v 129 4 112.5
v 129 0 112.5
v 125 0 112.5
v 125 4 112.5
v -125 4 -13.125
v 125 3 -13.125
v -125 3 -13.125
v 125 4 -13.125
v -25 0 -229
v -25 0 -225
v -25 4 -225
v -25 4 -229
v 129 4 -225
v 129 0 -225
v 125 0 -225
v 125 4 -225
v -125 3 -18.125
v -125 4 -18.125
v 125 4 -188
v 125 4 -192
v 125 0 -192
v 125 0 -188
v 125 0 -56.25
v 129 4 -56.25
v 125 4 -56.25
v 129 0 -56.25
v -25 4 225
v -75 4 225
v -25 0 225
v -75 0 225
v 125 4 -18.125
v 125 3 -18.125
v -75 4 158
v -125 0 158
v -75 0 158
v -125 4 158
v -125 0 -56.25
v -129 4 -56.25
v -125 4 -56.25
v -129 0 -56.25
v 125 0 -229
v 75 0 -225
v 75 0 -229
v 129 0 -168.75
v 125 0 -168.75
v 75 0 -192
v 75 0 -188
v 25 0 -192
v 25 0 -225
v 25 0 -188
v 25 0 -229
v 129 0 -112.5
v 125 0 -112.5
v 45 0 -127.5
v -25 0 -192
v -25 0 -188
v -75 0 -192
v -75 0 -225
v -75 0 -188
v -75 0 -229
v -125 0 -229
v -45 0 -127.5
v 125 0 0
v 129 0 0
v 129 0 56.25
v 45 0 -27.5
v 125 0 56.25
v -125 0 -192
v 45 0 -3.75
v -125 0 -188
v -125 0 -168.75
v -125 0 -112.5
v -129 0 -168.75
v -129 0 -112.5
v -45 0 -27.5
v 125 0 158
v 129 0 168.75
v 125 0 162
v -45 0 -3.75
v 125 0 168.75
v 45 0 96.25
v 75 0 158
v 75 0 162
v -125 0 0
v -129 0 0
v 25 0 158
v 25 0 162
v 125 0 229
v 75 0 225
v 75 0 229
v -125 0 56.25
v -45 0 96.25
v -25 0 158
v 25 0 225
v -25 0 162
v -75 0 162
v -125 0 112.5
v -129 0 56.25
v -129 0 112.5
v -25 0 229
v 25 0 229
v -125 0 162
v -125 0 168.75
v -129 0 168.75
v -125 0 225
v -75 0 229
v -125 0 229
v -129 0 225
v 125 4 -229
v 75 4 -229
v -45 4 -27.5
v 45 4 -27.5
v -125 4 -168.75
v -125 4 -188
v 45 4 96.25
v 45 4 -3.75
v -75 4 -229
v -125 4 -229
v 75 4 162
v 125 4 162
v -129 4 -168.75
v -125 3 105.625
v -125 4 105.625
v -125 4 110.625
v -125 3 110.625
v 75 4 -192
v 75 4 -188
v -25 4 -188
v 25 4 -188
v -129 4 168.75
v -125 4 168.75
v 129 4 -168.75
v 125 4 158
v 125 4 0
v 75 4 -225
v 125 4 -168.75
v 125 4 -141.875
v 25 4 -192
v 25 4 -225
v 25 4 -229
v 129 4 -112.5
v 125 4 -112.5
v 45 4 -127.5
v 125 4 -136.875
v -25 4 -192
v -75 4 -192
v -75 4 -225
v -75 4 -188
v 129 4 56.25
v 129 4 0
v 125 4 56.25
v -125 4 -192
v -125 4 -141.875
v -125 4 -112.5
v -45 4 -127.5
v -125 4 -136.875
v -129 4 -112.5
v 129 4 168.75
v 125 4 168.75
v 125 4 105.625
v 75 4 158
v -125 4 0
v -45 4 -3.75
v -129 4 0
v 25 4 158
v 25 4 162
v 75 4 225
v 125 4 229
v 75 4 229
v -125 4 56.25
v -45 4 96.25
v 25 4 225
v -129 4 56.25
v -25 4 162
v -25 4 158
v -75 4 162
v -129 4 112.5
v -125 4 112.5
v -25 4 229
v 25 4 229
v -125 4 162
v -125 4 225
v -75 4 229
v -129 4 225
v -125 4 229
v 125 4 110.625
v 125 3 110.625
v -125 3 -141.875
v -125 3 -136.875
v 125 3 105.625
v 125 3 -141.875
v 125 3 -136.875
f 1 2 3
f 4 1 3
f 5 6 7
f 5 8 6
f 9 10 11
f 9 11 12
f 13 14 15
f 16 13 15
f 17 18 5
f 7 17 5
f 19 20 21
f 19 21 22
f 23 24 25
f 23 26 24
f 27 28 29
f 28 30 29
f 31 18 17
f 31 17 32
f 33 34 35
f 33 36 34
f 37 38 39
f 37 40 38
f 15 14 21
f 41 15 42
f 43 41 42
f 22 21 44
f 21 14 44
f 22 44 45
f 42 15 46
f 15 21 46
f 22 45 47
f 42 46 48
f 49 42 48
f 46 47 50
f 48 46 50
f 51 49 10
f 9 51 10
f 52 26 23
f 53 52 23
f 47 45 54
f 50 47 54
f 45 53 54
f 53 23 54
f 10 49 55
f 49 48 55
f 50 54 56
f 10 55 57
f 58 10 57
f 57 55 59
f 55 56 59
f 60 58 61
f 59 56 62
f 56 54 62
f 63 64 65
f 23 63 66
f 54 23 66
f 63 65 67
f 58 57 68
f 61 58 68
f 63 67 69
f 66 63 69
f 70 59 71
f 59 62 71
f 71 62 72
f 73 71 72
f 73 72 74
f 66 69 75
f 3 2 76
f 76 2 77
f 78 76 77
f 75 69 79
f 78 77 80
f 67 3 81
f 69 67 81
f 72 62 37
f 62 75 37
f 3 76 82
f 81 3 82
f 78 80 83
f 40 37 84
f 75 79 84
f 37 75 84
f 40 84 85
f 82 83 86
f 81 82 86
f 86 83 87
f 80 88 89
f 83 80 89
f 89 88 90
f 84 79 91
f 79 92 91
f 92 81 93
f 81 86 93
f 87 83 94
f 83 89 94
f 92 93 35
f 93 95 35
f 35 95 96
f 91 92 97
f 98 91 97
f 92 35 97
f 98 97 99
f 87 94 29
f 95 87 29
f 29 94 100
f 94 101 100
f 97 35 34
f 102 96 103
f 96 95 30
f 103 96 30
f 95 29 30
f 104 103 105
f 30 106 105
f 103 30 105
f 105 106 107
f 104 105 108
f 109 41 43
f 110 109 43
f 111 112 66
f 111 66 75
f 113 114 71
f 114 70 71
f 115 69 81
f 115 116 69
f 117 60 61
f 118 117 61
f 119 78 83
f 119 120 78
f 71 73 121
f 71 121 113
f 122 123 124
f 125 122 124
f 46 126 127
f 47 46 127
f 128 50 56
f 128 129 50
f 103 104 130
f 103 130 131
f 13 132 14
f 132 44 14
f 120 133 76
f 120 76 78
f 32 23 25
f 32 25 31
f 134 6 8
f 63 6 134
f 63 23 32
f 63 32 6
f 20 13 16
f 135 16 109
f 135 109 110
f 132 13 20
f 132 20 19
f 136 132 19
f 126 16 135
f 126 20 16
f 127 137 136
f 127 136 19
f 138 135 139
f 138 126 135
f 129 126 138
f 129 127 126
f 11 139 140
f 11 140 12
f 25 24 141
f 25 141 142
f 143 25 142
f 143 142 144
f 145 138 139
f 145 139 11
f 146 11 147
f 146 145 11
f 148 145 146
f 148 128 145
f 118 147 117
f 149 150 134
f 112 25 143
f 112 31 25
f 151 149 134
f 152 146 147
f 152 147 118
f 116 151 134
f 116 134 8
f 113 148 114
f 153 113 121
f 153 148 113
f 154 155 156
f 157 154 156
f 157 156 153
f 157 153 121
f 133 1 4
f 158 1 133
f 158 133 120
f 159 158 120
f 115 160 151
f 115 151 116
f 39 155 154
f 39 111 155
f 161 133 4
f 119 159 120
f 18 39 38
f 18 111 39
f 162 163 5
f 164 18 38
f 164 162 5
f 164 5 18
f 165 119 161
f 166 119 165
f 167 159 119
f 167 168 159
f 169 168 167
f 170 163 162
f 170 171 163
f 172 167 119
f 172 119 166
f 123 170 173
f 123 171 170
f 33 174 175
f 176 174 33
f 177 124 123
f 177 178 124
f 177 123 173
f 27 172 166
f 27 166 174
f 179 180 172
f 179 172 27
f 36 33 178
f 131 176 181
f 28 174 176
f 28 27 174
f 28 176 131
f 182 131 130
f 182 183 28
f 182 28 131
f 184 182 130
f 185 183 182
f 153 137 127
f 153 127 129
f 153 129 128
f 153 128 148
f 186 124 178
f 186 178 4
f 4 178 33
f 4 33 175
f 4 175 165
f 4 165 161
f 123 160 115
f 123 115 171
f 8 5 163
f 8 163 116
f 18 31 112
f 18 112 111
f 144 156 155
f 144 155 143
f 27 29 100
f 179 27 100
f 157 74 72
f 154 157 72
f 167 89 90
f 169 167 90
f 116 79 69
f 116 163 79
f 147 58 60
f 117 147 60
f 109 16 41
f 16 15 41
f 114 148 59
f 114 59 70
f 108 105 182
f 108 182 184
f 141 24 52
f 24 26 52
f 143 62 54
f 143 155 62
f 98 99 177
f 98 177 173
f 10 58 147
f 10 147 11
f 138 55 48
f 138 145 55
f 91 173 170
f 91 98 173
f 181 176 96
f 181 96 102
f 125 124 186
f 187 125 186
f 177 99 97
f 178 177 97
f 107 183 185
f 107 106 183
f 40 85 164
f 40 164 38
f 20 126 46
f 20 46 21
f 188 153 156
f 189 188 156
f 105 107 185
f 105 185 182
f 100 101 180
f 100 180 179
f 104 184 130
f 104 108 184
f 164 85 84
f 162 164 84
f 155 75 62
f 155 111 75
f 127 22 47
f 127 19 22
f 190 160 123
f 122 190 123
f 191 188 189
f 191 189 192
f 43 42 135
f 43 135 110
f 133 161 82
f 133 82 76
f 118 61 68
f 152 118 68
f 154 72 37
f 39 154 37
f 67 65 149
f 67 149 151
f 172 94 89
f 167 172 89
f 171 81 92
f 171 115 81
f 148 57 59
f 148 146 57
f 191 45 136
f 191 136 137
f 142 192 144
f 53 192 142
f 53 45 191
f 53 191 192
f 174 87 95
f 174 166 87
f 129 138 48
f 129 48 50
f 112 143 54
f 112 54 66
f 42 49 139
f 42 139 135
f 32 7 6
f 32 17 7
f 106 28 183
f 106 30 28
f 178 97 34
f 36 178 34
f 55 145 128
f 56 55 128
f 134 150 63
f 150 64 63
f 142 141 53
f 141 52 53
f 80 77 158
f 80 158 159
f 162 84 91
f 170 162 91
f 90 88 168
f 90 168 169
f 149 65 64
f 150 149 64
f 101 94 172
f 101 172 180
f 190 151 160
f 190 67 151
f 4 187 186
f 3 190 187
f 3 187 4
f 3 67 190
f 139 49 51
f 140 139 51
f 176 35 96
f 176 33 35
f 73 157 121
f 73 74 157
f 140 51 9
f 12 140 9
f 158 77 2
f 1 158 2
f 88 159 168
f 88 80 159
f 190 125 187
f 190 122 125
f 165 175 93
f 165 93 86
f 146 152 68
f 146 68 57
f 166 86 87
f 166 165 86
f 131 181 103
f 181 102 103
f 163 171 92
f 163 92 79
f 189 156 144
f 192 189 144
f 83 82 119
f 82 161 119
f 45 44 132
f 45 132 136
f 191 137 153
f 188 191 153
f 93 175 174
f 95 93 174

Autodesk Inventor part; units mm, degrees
ref_plane "YZ Plane" through (0, 0, 0) normal (1, 0, 0) x (0, 1, 0)
ref_plane "XZ Plane" through (0, 0, 0) normal (0, 1, 0) x (-1, 0, 0)
ref_plane "XY Plane" through (0, 0, 0) normal (0, 0, 1) x (1, 0, 0)
sketch "Sketch1" plane through (0, 0, 0) normal (0, 1, 0) x (-1, 0, 0)
  line L0 (-125, 225) -> (125, 225) construction
  line L1 (125, 225) -> (125, -225) construction
  line L2 (125, -225) -> (-125, -225) construction
  line L3 (-125, -225) -> (-125, 225) construction
  line L4 (-125, 225) -> (125, -225) construction
  line L5 (125, 225) -> (-125, -225) construction
  line L6 (125, 225) -> (75, 225) construction
  line L7 (75, 225) -> (75, 229)
  line L8 (75, 229) -> (125, 229)
  line L9 (125, 229) -> (125, 225)
  line L10 (125, 225) -> (129, 225)
  line L11 (129, 225) -> (129, 168.75)
  line L12 (129, 168.75) -> (125, 168.75)
  line L13 (125, 168.75) -> (125, 225) construction
  line L14 (-125, 225) -> (-129, 225) construction
  line L15 (-129, 225) -> (-129, 168.75) construction
  line L16 (-129, 168.75) -> (-125, 168.75)
  line L17 (-125, 168.75) -> (-125, 225)
  line L18 (125, -225) -> (75, -225) construction
  line L19 (75, -225) -> (75, -229)
  line L20 (75, -229) -> (125, -229)
  line L21 (125, -229) -> (125, -225)
  line L22 (125, 112.5) -> (125, 168.75)
  line L23 (125, 168.75) -> (129, 168.75)
  line L24 (129, 112.5) -> (125, 112.5)
  line L25 (129, 168.75) -> (129, 112.5) construction
  line L26 (-125, 112.5) -> (-125, 168.75) construction
  line L27 (-125, 168.75) -> (-129, 168.75)
  line L28 (-129, 168.75) -> (-129, 112.5)
  line L29 (-129, 112.5) -> (-125, 112.5)
  line L30 (125, 56.25) -> (125, 112.5) construction
  line L31 (125, 112.5) -> (129, 112.5)
  line L32 (129, 56.25) -> (125, 56.25)
  line L33 (129, 112.5) -> (129, 56.25)
  line L34 (-125, 56.25) -> (-125, 112.5)
  line L35 (-125, 112.5) -> (-129, 112.5)
  line L36 (-129, 112.5) -> (-129, 56.25) construction
  line L37 (-129, 56.25) -> (-125, 56.25)
  line L38 (125, 0) -> (125, 56.25)
  line L39 (125, 56.25) -> (129, 56.25)
  line L40 (129, 0) -> (125, 0)
  line L41 (129, 56.25) -> (129, 0) construction
  line L42 (-125, 0) -> (-125, 56.25) construction
  line L43 (-125, 56.25) -> (-129, 56.25)
  line L44 (-129, 56.25) -> (-129, 0)
  line L45 (-129, 0) -> (-125, 0)
  line L46 (125, -56.25) -> (125, 0) construction
  line L47 (125, 0) -> (129, 0)
  line L48 (129, -56.25) -> (125, -56.25)
  line L49 (129, 0) -> (129, -56.25)
  line L50 (-125, -56.25) -> (-125, 0)
  line L51 (-125, 0) -> (-129, 0)
  line L52 (-129, 0) -> (-129, -56.25) construction
  line L53 (-129, -56.25) -> (-125, -56.25)
  line L54 (125, -112.5) -> (125, -56.25)
  line L55 (125, -56.25) -> (129, -56.25)
  line L56 (129, -112.5) -> (125, -112.5)
  line L57 (129, -56.25) -> (129, -112.5) construction
  line L58 (-125, -112.5) -> (-125, -56.25) construction
  line L59 (-125, -56.25) -> (-129, -56.25)
  line L60 (-129, -56.25) -> (-129, -112.5)
  line L61 (-129, -112.5) -> (-125, -112.5)
  line L62 (125, -168.75) -> (125, -112.5) construction
  line L63 (125, -112.5) -> (129, -112.5)
  line L64 (129, -168.75) -> (125, -168.75)
  line L65 (129, -112.5) -> (129, -168.75)
  line L66 (-125, -168.75) -> (-125, -112.5)
  line L67 (-125, -112.5) -> (-129, -112.5)
  line L68 (-129, -112.5) -> (-129, -168.75) construction
  line L69 (-129, -168.75) -> (-125, -168.75)
  line L70 (125, -225) -> (125, -168.75)
  line L71 (125, -168.75) -> (129, -168.75)
  line L72 (129, -225) -> (125, -225) construction
  line L73 (129, -168.75) -> (129, -225) construction
  line L74 (-125, -225) -> (-125, -168.75) construction
  line L75 (-125, -168.75) -> (-129, -168.75)
  line L76 (-129, -168.75) -> (-129, -225)
  line L77 (-129, -225) -> (-125, -225)
  line L78 (75, 229) -> (75, 225)
  line L79 (25, 225) -> (25, 229)
  line L80 (25, 229) -> (75, 229) construction
  line L81 (75, 225) -> (25, 225)
  line L82 (75, -225) -> (25, -225)
  line L83 (25, -225) -> (25, -229)
  line L84 (25, -229) -> (75, -229) construction
  line L85 (75, -229) -> (75, -225)
  line L86 (25, 229) -> (25, 225)
  line L87 (-25, 225) -> (-25, 229)
  line L88 (-25, 229) -> (25, 229)
  line L89 (25, 225) -> (-25, 225) construction
  line L90 (25, -225) -> (-25, -225) construction
  line L91 (-25, -225) -> (-25, -229)
  line L92 (-25, -229) -> (25, -229)
  line L93 (25, -229) -> (25, -225)
  line L94 (-25, 229) -> (-25, 225)
  line L95 (-75, 225) -> (-75, 229)
  line L96 (-75, 229) -> (-25, 229) construction
  line L97 (-25, 225) -> (-75, 225)
  line L98 (-25, -225) -> (-75, -225)
  line L99 (-75, -225) -> (-75, -229)
  line L100 (-75, -229) -> (-25, -229) construction
  line L101 (-25, -229) -> (-25, -225)
  line L102 (-75, 229) -> (-75, 225)
  line L103 (-125, 225) -> (-125, 229)
  line L104 (-125, 229) -> (-75, 229)
  line L105 (-75, 225) -> (-125, 225) construction
  line L106 (-75, -225) -> (-125, -225) construction
  line L107 (-125, -225) -> (-125, -229)
  line L108 (-125, -229) -> (-75, -229)
  line L109 (-75, -229) -> (-75, -225)
  point P0 (0, 0)
  point P1 (75, -225)
  point P2 (25, -225)
  point P3 (-25, -225)
  point P4 (-75, -225)
  point P5 (-129, 168.75)
  point P6 (-129, 56.25)
  point P7 (-129, -168.75)
  dimension "d0" = 250
  dimension "d1" = 450
  dimension "d2" = 50
  dimension "d3" = 4
  dimension "d4" = 4
  dimension "d5" = 56.25
  dimension "d6" = 4
  dimension "d7" = 56.25
  dimension "d8" = 50
  dimension "d9" = 4
  dimension "d12" = 56.25
  dimension "d19" = 50
extrude "Extrusion1" add sketch "Sketch1" along normal blind 4
sketch "Sketch2" plane through (0, 4, 0) normal (0, 1, 0) x (1, 0, 0)
  line L0 (-125, 112.5) -> (-125, 56.25) projected
  line L1 (129, 112.5) -> (125, 112.5) projected
  line L2 (-125, 112.5) -> (125, 112.5) construction
  line L3 (125, -112.5) -> (125, -56.25) projected
  line L4 (125, -56.25) -> (-125, -56.25) construction
  line L5 (-45, 127.5) -> (45, 127.5)
  line L6 (45, 127.5) -> (45, 27.5)
  line L7 (45, 27.5) -> (-45, 27.5)
  line L8 (-45, 27.5) -> (-45, 127.5)
  line L9 (-45, 127.5) -> (45, 27.5) construction
  line L10 (45, 127.5) -> (-45, 27.5) construction
  line L11 (45, -96.25) -> (-45, -96.25)
  line L12 (-45, -96.25) -> (-45, 3.75)
  line L13 (-45, 3.75) -> (45, 3.75)
  line L14 (45, 3.75) -> (45, -96.25)
  line L15 (45, -96.25) -> (-45, 3.75) construction
  line L16 (-45, -96.25) -> (45, 3.75) construction
  line L17 (25, 229) -> (-25, 229) projected
  point P0 (0, 0)
  point P1 (0, 77.5)
  point P2 (0, -46.25)
  point P3 (0, -46.25)
  point P4 (0, 77.5)
  point P5 (0, 77.5)
  point P6 (0, 229)
  point P7 (0, -46.25)
  dimension "d26" = 90
  dimension "d27" = 100
  dimension "d28" = 90
  dimension "d29" = 100
  dimension "d59" = 35
  dimension "d60" = 10
extrude "Extrusion2" cut sketch "Sketch2" against normal up to next
sketch "Sketch3" plane through (0, 4, 0) normal (0, 1, 0) x (1, 0, 0)
  line L0 (-129, 56.25) -> (-129, 0) projected
  line L1 (125, 0) -> (125, 56.25) projected
  line L2 (-129, 18.125) -> (125, 18.125)
  line L3 (125, 18.125) -> (125, 13.125)
  line L4 (125, 13.125) -> (-129, 13.125)
  line L5 (-129, 13.125) -> (-129, 18.125)
  line L6 (-128.3607, 15.625) -> (125.6393, 15.625) construction
  line L7 (-129, 18.125) -> (-125, 18.125)
  line L8 (-125, 18.125) -> (-125, 13.125)
  line L9 (-125, 13.125) -> (-129, 13.125)
  line L10 (-129, 13.125) -> (-129, 18.125)
  line L11 (-125, 0) -> (-125, -56.25) projected
  line L12 (45, 127.5) -> (45, 27.5) projected
  line L13 (45, 27.5) -> (-45, 27.5) projected
  line L14 (-45, 27.5) -> (-45, 127.5) projected
  line L15 (-45, 127.5) -> (45, 127.5) projected
  line L16 (-45, -96.25) -> (-45, 3.75) projected
  line L17 (-45, 3.75) -> (45, 3.75) projected
  line L18 (45, 3.75) -> (45, -96.25) projected
  line L19 (45, -96.25) -> (-45, -96.25) projected
  line L20 (-25, -225) -> (-25, -229) projected
  line L21 (-25, -229) -> (25, -229) projected
  line L22 (25, -229) -> (25, -225) projected
  line L23 (25, -225) -> (75, -225) projected
  line L24 (75, -225) -> (75, -229) projected
  line L25 (75, -229) -> (125, -229) projected
  line L26 (125, -229) -> (125, -168.75) projected
  line L27 (125, -168.75) -> (129, -168.75) projected
  line L28 (129, -168.75) -> (129, -112.5) projected
  line L29 (129, -112.5) -> (125, -112.5) projected
  line L30 (125, -112.5) -> (125, -56.25) projected
  line L31 (125, -56.25) -> (129, -56.25) projected
  line L32 (129, -56.25) -> (129, 0) projected
  line L33 (129, 0) -> (125, 0) projected
  line L34 (125, 0) -> (125, 56.25) projected
  line L35 (125, 56.25) -> (129, 56.25) projected
  line L36 (129, 56.25) -> (129, 112.5) projected
  line L37 (129, 112.5) -> (125, 112.5) projected
  line L38 (125, 112.5) -> (125, 168.75) projected
  line L39 (125, 168.75) -> (129, 168.75) projected
  line L40 (129, 168.75) -> (129, 225) projected
  line L41 (129, 225) -> (125, 225) projected
  line L42 (125, 225) -> (125, 229) projected
  line L43 (125, 229) -> (75, 229) projected
  line L44 (75, 229) -> (75, 225) projected
  line L45 (75, 225) -> (25, 225) projected
  line L46 (25, 225) -> (25, 229) projected
  line L47 (25, 229) -> (-25, 229) projected
  line L48 (-25, 229) -> (-25, 225) projected
  line L49 (-25, 225) -> (-75, 225) projected
  line L50 (-75, 225) -> (-75, 229) projected
  line L51 (-75, 229) -> (-125, 229) projected
  line L52 (-125, 229) -> (-125, 168.75) projected
  line L53 (-125, 168.75) -> (-129, 168.75) projected
  line L54 (-129, 168.75) -> (-129, 112.5) projected
  line L55 (-129, 112.5) -> (-125, 112.5) projected
  line L56 (-125, 112.5) -> (-125, 56.25) projected
  line L57 (-125, 56.25) -> (-129, 56.25) projected
  line L58 (-129, 56.25) -> (-129, 0) projected
  line L59 (-129, 0) -> (-125, 0) projected
  line L60 (-125, 0) -> (-125, -56.25) projected
  line L61 (-125, -56.25) -> (-129, -56.25) projected
  line L62 (-129, -56.25) -> (-129, -112.5) projected
  line L63 (-129, -112.5) -> (-125, -112.5) projected
  line L64 (-125, -112.5) -> (-125, -168.75) projected
  line L65 (-125, -168.75) -> (-129, -168.75) projected
  line L66 (-129, -168.75) -> (-129, -225) projected
  line L67 (-129, -225) -> (-125, -225) projected
  line L68 (-125, -225) -> (-125, -229) projected
  line L69 (-125, -229) -> (-75, -229) projected
  line L70 (-75, -229) -> (-75, -225) projected
  line L71 (-75, -225) -> (-25, -225) projected
  line L72 (-45, -96.25) -> (-45, 3.75) projected
  line L73 (-45, 27.5) -> (-45, 3.75) construction
  point P0 (0, 0)
  point P1 (125, 13.125)
  point P2 (-125, 15.625)
  point P3 (-45, 15.625)
  dimension "d32" = 5
extrude "Extrusion3" cut sketch "Sketch3" against normal blind 1 contours L2 L1 L4 L8
sketch "Sketch4" plane through (0, 4, 0) normal (0, 1, 0) x (1, 0, 0)
  line L0 (-125, -110.625) -> (125, -110.625)
  line L1 (125, -110.625) -> (125, -105.625)
  line L2 (125, -105.625) -> (-125, -105.625)
  line L3 (-125, -105.625) -> (-125, -110.625)
  line L4 (-125, -110.625) -> (125, -105.625) construction
  line L5 (125, -110.625) -> (-125, -105.625) construction
  line L6 (-125, -112.5) -> (-125, -168.75) projected
  line L7 (-125, -108.125) -> (125, -108.125) construction
  line L8 (129, -168.75) -> (129, -112.5) projected
  line L9 (129, 168.75) -> (129, 225) projected
  line L10 (129, 139.375) -> (-125, 139.375) construction
  line L11 (-125, 229) -> (-125, 168.75) projected
  line L12 (-125, 136.875) -> (125, 136.875)
  line L13 (125, 136.875) -> (125, 141.875)
  line L14 (125, 141.875) -> (-125, 141.875)
  line L15 (-125, 141.875) -> (-125, 136.875)
  line L16 (-125, 136.875) -> (125, 141.875) construction
  line L17 (125, 136.875) -> (-125, 141.875) construction
  line L18 (125, 112.5) -> (125, 168.75) projected
  line L19 (-125, 229) -> (-125, 168.75) projected
  line L20 (45, 3.75) -> (-45, 3.75) projected
  line L21 (-45, 3.75) -> (-45, 13.125) construction
  line L22 (125, 13.125) -> (-125, 13.125) projected
  line L23 (-125, 13.125) -> (-125, 18.125) projected
  line L24 (-125, 18.125) -> (125, 18.125) projected
  line L25 (125, 18.125) -> (125, 56.25) projected
  line L26 (125, 56.25) -> (129, 56.25) projected
  line L27 (129, 56.25) -> (129, 112.5) projected
  line L28 (129, 112.5) -> (125, 112.5) projected
  line L29 (125, 112.5) -> (125, 168.75) projected
  line L30 (125, 168.75) -> (129, 168.75) projected
  line L31 (129, 168.75) -> (129, 225) projected
  line L32 (129, 225) -> (125, 225) projected
  line L33 (125, 225) -> (125, 229) projected
  line L34 (125, 229) -> (75, 229) projected
  line L35 (75, 229) -> (75, 225) projected
  line L36 (75, 225) -> (25, 225) projected
  line L37 (25, 225) -> (25, 229) projected
  line L38 (25, 229) -> (-25, 229) projected
  line L39 (-25, 229) -> (-25, 225) projected
  line L40 (-25, 225) -> (-75, 225) projected
  line L41 (-75, 225) -> (-75, 229) projected
  line L42 (-75, 229) -> (-125, 229) projected
  line L43 (-125, 229) -> (-125, 168.75) projected
  line L44 (-125, 168.75) -> (-129, 168.75) projected
  line L45 (-129, 168.75) -> (-129, 112.5) projected
  line L46 (-129, 112.5) -> (-125, 112.5) projected
  line L47 (-125, 112.5) -> (-125, 56.25) projected
  line L48 (-125, 56.25) -> (-129, 56.25) projected
  line L49 (-129, 56.25) -> (-129, 0) projected
  line L50 (-129, 0) -> (-125, 0) projected
  line L51 (-125, 0) -> (-125, -56.25) projected
  line L52 (-125, -56.25) -> (-129, -56.25) projected
  line L53 (-129, -56.25) -> (-129, -112.5) projected
  line L54 (-129, -112.5) -> (-125, -112.5) projected
  line L55 (-125, -112.5) -> (-125, -168.75) projected
  line L56 (-125, -168.75) -> (-129, -168.75) projected
  line L57 (-129, -168.75) -> (-129, -225) projected
  line L58 (-129, -225) -> (-125, -225) projected
  line L59 (-125, -225) -> (-125, -229) projected
  line L60 (-125, -229) -> (-75, -229) projected
  line L61 (-75, -229) -> (-75, -225) projected
  line L62 (-75, -225) -> (-25, -225) projected
  line L63 (-25, -225) -> (-25, -229) projected
  line L64 (-25, -229) -> (25, -229) projected
  line L65 (25, -229) -> (25, -225) projected
  line L66 (25, -225) -> (75, -225) projected
  line L67 (75, -225) -> (75, -229) projected
  line L68 (75, -229) -> (125, -229) projected
  line L69 (125, -229) -> (125, -168.75) projected
  line L70 (125, -168.75) -> (129, -168.75) projected
  line L71 (129, -168.75) -> (129, -112.5) projected
  line L72 (129, -112.5) -> (125, -112.5) projected
  line L73 (125, -112.5) -> (125, -56.25) projected
  line L74 (125, -56.25) -> (129, -56.25) projected
  line L75 (129, -56.25) -> (129, 0) projected
  line L76 (129, 0) -> (125, 0) projected
  line L77 (125, 0) -> (125, 13.125) projected
  line L78 (-45, -96.25) -> (-45, 3.75) projected
  line L79 (-45, 3.75) -> (45, 3.75) projected
  line L80 (45, 3.75) -> (45, -96.25) projected
  line L81 (45, -96.25) -> (-45, -96.25) projected
  line L82 (45, 127.5) -> (45, 27.5) projected
  line L83 (45, 27.5) -> (-45, 27.5) projected
  line L84 (-45, 27.5) -> (-45, 127.5) projected
  line L85 (-45, 127.5) -> (45, 127.5) projected
  line L86 (-45, -96.25) -> (-45, 3.75) projected
  line L87 (-45, -96.25) -> (-45, -105.625) construction
  line L88 (125, 13.125) -> (-125, 13.125) projected
  line L89 (-45, 127.5) -> (-45, 27.5) projected
  line L90 (-45, 127.5) -> (-45, 136.875) construction
  point P0 (0, 0)
  point P1 (0, -108.125)
  point P2 (0, 139.375)
  point P3 (-125, 183.1313)
  point P4 (-125, 178.1313)
  dimension "d36" = 5
  dimension "d39" = 5
extrude "Extrusion4" cut sketch "Sketch4" against normal blind 1 contours L3 L2 L1 L0 | L12 L15 L14 L13
sketch "Sketch5" plane through (0, 4, 0) normal (0, 1, 0) x (1, 0, 0)
  line L0 (-125, -158) -> (-75, -158)
  line L1 (-75, -158) -> (-75, -162)
  line L2 (-75, -162) -> (-125, -162)
  line L3 (-125, -162) -> (-125, -158)
  line L4 (-75, -225) -> (-25, -225) projected
  line L5 (-125, -112.5) -> (-125, -168.75) projected
  line L6 (125, -110.625) -> (-125, -110.625) projected
  line L7 (-75, -158) -> (-25, -158)
  line L8 (-25, -158) -> (-25, -162)
  line L9 (-25, -162) -> (-75, -162)
  line L10 (-75, -162) -> (-75, -158)
  line L11 (-25, -158) -> (25, -158)
  line L12 (25, -158) -> (25, -162)
  line L13 (25, -162) -> (-25, -162)
  line L14 (-25, -162) -> (-25, -158)
  line L15 (25, -158) -> (75, -158)
  line L16 (75, -158) -> (75, -162)
  line L17 (75, -162) -> (25, -162)
  line L18 (25, -162) -> (25, -158)
  line L19 (75, -158) -> (125, -158)
  line L20 (125, -158) -> (125, -162)
  line L21 (125, -162) -> (75, -162)
  line L22 (75, -162) -> (75, -158)
  line L23 (-25, 188) -> (-75, 188)
  line L24 (-75, 192) -> (-25, 192)
  line L25 (-25, 192) -> (-25, 188)
  line L26 (-25, 188) -> (-25, 192)
  line L27 (25, 188) -> (-25, 188)
  line L28 (-25, 192) -> (25, 192)
  line L29 (25, 192) -> (25, 188)
  line L30 (25, 188) -> (25, 192)
  line L31 (25, 192) -> (75, 192)
  line L32 (75, 188) -> (25, 188)
  line L33 (-75, 192) -> (-75, 188)
  line L34 (-75, 188) -> (-75, 192)
  line L35 (-125, 192) -> (-75, 192)
  line L36 (-125, 188) -> (-125, 192)
  line L37 (-75, 188) -> (-125, 188)
  line L38 (75, 192) -> (75, 188)
  line L39 (75, 188) -> (75, 192)
  line L40 (75, 192) -> (125, 192)
  line L41 (125, 192) -> (125, 188)
  line L42 (125, 188) -> (75, 188)
  point P0 (0, 0)
  point P1 (125, -143.125)
  point P2 (-125, -110.625)
  dimension "d40" = 50
  dimension "d41" = 4
  dimension "d42" = 63
  dimension "d45" = 50
  dimension "d54" = 350
extrude "Extrusion5" cut sketch "Sketch5" against normal up to next contours L0 L1 L2 L3 | L11 L12 L13 L8 | L19 L20 L21 L16 | L25 L28 L29 L27 | L37 L36 L35 L33 | L38 L40 L41 L42
properties part number "DoorFront_V2"
